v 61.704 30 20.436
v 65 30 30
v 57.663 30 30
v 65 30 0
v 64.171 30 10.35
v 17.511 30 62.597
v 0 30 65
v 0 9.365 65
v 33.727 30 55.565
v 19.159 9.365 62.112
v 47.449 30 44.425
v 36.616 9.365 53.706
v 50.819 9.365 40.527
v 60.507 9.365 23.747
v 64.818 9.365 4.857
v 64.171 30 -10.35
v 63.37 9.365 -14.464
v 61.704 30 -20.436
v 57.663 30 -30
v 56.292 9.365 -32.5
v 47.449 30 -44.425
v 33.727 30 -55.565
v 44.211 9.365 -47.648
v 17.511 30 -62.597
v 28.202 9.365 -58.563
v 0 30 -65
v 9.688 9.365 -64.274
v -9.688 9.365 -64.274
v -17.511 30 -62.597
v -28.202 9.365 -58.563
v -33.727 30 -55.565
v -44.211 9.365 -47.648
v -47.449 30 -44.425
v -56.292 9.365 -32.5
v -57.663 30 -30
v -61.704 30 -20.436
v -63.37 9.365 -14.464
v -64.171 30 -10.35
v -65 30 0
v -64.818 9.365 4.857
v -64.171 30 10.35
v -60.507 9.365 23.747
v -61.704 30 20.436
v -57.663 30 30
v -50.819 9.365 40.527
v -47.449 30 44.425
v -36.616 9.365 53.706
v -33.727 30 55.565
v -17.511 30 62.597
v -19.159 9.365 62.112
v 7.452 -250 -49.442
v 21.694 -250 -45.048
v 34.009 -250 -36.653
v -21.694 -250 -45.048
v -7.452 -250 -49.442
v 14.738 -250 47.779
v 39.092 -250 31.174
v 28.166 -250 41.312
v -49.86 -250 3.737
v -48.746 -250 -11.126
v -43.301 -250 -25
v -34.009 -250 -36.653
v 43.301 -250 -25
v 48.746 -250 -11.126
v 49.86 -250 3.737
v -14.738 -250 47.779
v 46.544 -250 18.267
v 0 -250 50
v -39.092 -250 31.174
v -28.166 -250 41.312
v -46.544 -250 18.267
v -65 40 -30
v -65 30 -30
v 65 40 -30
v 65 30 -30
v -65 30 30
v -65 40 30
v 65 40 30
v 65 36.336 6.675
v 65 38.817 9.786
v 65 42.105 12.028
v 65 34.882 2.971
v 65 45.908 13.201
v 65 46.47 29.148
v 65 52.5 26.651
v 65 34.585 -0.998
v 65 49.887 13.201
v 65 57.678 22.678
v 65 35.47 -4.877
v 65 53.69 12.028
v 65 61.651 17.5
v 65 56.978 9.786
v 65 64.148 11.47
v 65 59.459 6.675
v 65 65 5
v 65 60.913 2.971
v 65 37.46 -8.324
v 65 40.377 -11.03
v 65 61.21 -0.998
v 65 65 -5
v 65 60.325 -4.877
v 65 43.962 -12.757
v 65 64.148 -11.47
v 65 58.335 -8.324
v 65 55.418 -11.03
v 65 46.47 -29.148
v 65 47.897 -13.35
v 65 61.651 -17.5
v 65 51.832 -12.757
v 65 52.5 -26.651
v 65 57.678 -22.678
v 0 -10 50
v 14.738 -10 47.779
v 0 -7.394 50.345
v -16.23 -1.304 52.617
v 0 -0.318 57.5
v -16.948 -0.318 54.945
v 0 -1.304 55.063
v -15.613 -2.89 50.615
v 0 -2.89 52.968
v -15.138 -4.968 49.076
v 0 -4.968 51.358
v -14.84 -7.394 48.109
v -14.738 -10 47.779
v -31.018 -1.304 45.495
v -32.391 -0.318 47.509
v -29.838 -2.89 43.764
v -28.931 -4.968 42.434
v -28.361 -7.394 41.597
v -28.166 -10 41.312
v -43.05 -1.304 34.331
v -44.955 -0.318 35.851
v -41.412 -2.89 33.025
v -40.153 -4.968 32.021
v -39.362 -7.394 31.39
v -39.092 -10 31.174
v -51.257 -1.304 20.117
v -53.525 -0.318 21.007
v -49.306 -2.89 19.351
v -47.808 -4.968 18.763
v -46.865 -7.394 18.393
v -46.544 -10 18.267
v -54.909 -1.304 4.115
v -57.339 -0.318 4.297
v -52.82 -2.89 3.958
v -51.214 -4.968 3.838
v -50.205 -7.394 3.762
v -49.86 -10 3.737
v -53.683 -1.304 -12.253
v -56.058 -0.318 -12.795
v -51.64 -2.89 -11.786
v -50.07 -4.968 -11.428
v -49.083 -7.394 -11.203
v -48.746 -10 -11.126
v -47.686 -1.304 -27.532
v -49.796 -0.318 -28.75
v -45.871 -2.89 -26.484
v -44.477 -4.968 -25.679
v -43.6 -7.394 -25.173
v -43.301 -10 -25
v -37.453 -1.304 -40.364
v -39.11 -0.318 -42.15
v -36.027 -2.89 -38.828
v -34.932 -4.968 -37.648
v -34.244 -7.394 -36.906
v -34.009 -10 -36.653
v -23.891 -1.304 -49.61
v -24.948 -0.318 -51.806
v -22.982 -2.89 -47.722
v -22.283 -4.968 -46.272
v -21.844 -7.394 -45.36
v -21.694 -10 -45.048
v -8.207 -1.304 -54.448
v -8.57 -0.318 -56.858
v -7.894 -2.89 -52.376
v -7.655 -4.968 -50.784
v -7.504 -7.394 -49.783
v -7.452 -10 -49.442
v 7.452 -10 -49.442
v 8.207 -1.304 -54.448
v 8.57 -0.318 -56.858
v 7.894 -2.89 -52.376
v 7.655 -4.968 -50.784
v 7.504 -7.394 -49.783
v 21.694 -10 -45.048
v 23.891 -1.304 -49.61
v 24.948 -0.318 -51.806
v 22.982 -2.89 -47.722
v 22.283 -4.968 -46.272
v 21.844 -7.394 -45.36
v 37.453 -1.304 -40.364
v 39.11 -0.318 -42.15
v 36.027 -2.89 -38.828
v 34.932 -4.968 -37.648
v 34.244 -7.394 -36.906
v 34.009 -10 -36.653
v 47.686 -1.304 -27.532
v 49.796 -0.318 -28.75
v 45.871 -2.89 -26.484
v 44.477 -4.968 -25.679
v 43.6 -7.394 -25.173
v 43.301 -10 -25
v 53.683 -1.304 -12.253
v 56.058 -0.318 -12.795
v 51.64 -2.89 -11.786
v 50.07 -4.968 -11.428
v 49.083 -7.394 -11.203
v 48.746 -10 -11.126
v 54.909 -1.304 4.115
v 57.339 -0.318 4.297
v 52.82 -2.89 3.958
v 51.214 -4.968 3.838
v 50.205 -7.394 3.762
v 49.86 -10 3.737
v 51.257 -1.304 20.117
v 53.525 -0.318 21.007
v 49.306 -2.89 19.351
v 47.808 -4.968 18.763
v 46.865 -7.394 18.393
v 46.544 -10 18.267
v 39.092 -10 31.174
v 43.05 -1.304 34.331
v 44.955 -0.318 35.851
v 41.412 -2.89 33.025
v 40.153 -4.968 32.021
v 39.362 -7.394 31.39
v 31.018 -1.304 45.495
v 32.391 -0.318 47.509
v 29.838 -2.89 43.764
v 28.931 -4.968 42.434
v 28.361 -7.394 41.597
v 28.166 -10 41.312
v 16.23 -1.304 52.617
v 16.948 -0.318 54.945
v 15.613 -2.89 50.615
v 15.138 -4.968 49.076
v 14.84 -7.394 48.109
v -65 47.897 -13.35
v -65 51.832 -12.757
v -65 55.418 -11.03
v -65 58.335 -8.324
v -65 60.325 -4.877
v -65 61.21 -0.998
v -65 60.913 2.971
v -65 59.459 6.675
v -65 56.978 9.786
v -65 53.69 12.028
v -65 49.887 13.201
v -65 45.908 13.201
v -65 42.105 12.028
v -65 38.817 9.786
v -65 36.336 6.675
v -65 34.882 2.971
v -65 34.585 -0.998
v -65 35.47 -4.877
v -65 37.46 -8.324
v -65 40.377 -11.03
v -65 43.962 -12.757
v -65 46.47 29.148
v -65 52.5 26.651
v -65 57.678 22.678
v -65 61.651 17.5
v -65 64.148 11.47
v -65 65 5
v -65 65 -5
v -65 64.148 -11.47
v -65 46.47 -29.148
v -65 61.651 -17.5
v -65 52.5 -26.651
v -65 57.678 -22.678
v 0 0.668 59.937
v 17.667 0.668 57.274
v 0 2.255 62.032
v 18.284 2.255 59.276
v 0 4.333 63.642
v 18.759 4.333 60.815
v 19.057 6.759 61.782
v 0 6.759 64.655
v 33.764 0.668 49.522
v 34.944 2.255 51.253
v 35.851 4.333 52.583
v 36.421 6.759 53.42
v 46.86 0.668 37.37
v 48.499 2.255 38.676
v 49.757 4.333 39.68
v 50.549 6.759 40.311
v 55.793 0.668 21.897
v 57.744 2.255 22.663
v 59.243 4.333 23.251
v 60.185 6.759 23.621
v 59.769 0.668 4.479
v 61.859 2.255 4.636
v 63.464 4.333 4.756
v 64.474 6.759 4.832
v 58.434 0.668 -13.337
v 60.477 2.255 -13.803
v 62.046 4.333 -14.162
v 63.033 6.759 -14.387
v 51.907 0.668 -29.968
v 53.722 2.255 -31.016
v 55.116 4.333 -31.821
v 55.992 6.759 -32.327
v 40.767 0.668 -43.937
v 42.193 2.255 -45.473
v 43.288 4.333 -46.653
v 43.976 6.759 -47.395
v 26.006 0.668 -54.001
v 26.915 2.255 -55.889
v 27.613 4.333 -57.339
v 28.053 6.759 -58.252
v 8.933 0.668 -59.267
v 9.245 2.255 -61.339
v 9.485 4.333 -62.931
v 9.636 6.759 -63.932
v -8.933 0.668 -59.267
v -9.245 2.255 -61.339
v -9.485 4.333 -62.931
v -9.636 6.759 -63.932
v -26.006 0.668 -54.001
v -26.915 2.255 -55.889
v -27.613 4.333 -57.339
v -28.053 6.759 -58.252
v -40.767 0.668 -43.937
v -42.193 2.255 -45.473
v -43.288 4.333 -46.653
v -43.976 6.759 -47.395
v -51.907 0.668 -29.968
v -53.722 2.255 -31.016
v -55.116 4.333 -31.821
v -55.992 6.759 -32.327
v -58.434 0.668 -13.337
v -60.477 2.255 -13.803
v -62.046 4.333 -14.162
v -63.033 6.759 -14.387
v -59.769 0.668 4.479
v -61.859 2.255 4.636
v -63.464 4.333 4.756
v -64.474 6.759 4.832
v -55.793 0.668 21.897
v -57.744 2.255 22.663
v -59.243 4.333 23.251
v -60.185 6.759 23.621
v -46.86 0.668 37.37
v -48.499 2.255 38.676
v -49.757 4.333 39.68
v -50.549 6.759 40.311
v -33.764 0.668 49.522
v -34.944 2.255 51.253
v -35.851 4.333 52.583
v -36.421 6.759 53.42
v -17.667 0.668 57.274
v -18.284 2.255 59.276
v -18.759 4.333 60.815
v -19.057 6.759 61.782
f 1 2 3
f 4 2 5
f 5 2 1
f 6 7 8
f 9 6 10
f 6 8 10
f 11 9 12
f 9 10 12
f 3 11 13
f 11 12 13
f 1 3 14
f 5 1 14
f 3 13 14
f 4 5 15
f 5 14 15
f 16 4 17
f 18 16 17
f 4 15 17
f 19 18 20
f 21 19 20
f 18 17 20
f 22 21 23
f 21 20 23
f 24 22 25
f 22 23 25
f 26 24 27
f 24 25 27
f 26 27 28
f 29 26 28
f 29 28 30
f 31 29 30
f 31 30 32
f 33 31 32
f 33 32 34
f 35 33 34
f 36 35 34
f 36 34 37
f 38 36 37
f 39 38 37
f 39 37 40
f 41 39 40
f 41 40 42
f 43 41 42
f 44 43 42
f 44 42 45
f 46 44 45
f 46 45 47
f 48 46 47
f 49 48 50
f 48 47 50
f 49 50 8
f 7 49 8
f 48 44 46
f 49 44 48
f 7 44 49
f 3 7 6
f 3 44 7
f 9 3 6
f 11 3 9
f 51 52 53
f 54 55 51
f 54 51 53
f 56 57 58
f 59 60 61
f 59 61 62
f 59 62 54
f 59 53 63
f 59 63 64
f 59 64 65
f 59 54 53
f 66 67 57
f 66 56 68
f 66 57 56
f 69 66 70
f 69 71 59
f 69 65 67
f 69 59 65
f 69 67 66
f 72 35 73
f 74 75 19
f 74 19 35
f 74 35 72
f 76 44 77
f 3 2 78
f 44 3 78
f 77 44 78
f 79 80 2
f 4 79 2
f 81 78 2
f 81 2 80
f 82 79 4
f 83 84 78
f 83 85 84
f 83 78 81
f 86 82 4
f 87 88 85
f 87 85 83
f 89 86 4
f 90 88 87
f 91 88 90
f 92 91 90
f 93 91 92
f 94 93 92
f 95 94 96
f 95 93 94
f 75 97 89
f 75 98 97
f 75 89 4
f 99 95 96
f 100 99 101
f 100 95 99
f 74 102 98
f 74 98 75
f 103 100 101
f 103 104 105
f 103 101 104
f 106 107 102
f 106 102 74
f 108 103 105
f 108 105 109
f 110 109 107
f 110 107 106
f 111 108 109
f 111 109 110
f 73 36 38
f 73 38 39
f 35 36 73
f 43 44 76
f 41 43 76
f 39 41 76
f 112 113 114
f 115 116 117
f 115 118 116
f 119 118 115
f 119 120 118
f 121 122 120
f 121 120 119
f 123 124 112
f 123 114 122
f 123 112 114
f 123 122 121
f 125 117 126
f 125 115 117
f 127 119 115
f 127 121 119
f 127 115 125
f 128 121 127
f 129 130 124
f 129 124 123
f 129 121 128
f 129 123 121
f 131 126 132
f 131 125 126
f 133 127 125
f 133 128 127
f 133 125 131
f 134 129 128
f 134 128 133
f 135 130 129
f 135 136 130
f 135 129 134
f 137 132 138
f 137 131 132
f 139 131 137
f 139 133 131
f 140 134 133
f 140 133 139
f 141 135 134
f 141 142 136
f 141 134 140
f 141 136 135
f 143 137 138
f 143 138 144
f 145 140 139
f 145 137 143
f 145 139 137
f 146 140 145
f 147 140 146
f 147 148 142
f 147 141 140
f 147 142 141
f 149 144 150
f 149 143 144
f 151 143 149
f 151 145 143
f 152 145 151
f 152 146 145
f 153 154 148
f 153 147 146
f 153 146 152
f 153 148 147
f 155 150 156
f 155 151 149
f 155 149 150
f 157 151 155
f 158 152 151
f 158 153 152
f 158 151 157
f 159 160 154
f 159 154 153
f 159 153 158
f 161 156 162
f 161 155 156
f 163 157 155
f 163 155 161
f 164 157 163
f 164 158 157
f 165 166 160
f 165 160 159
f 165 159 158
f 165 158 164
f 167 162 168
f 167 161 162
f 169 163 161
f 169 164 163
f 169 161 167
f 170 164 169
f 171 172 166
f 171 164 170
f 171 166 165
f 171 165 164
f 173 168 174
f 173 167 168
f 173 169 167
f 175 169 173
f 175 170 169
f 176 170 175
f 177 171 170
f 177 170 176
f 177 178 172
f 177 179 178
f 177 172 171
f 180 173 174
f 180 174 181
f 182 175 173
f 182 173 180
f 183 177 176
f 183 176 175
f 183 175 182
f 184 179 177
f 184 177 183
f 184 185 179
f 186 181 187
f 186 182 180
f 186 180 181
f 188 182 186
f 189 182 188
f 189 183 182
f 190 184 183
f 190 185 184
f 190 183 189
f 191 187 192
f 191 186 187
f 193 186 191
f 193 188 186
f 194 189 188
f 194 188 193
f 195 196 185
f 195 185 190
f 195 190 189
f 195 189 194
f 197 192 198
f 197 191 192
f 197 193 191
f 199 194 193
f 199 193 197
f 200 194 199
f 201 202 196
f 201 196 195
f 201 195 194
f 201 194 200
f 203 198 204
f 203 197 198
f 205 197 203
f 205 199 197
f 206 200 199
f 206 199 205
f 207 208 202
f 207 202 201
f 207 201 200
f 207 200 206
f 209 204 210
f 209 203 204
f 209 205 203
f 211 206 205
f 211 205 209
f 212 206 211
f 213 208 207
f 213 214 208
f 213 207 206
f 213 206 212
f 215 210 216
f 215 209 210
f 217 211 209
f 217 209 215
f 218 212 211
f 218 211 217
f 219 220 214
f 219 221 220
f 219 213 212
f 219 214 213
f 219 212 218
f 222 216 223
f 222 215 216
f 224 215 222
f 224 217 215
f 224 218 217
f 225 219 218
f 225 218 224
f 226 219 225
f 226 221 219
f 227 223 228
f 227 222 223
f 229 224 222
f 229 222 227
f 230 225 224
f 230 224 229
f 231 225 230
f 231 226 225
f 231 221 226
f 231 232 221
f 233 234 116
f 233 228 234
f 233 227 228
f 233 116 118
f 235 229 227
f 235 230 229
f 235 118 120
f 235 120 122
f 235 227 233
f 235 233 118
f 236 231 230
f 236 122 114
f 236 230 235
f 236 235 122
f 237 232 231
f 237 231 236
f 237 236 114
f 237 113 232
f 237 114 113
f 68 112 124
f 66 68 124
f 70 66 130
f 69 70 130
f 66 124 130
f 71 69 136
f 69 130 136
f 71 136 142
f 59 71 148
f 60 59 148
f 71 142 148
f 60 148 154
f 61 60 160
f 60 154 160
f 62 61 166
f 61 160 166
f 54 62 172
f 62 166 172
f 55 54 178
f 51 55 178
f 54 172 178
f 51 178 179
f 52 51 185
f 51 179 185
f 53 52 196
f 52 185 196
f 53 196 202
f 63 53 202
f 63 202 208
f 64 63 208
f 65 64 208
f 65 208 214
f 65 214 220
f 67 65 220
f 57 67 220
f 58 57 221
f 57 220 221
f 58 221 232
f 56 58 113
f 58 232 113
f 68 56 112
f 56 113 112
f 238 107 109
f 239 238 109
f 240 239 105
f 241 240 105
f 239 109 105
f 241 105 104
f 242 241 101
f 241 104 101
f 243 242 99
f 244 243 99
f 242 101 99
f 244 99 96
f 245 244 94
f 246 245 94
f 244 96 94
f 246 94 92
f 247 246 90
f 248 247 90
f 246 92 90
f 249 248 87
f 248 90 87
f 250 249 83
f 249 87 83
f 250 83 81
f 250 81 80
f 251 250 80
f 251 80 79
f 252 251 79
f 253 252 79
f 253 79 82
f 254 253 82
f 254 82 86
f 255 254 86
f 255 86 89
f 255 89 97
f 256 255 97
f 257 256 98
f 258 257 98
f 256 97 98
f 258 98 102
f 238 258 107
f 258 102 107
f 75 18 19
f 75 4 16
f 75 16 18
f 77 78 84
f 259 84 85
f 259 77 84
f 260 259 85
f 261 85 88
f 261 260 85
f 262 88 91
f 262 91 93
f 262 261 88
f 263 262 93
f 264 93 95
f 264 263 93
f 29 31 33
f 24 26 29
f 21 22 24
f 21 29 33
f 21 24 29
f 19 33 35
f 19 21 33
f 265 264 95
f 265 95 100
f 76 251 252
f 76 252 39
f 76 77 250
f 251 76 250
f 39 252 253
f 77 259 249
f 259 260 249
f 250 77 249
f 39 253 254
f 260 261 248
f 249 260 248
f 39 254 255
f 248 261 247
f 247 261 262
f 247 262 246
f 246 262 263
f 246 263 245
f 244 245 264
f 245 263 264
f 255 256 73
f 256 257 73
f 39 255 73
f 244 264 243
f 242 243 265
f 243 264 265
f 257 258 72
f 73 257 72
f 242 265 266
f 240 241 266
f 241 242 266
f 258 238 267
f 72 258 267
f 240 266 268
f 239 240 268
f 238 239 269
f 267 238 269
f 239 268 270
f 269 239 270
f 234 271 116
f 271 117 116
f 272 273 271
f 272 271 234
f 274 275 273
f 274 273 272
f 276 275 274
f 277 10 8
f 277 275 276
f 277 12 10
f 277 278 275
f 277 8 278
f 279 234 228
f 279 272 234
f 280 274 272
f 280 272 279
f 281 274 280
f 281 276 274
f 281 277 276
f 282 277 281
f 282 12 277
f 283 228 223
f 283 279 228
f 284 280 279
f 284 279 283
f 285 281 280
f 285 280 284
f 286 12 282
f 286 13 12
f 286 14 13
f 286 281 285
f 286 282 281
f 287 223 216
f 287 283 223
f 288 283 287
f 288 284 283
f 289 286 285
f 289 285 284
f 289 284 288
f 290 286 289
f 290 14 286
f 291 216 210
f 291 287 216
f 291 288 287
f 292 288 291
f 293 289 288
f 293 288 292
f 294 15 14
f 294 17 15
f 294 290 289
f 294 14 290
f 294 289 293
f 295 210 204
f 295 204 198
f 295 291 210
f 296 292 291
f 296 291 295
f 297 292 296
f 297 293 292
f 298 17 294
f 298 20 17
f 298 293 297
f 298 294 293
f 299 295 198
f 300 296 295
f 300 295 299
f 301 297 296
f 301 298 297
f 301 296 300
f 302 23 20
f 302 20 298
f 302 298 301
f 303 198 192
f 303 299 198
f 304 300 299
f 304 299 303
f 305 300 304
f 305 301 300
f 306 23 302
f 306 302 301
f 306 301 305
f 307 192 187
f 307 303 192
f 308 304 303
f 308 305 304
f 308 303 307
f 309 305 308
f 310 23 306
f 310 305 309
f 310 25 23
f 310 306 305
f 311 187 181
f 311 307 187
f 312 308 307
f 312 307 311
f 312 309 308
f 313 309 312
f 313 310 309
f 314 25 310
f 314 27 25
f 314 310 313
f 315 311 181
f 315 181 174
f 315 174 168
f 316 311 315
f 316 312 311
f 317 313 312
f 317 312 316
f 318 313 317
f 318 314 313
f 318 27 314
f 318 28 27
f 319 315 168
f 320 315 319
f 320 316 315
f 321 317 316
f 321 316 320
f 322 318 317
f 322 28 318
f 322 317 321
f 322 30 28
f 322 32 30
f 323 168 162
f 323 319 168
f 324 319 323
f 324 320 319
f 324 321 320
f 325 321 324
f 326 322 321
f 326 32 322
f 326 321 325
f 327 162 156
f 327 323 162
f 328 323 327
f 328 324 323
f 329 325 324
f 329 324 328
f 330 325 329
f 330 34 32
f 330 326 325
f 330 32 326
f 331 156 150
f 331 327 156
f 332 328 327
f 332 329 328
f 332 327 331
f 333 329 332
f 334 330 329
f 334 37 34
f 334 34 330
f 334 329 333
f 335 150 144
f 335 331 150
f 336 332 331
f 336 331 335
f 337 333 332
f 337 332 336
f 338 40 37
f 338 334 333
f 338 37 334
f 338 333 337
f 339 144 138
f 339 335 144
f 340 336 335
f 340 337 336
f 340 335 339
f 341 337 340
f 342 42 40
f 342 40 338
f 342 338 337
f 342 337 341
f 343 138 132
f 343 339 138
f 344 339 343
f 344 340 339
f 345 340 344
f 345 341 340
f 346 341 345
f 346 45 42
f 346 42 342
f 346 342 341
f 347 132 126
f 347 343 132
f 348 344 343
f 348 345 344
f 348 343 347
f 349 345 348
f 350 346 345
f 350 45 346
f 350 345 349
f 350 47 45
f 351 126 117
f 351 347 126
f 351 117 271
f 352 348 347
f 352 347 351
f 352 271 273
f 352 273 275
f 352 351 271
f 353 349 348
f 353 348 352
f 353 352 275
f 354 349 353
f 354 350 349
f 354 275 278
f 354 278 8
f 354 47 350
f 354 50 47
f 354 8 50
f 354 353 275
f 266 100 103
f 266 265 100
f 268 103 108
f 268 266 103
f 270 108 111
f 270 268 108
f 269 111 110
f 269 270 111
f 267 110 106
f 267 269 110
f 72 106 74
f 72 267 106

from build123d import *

# Parameters (mm, degrees)
SKETCH1_R           = 65
BOSS_EXTRUDE1_DEPTH = 30
SKETCH2_R           = 50
BOSS_EXTRUDE2_DEPTH = 250
FILLET1_R           = 10
FILLET2_R           = 10
SKETCH3_W           = 60
SKETCH3_H           = 35
BOSS_EXTRUDE3_DEPTH = 65
SKETCH4_R           = 13.35
CUT_EXTRUDE1_DEPTH  = 130
FILLET3_R           = 25


with BuildPart() as part:
    # Sketch1 → Boss-Extrude1 (new body)
    with BuildSketch(Plane(origin=(0, 0, 0), x_dir=(1, 0, 0), z_dir=(0, 1, 0))):
        with Locations(Location((0, 0, 0), (0, 0, 270))):
            Circle(SKETCH1_R)
    extrude(amount=BOSS_EXTRUDE1_DEPTH)

    # Sketch2 → Boss-Extrude2 (add)
    with BuildSketch(Plane.XZ):
        with Locations(Location((0, 0, 0), (0, 0, 90))):
            Circle(SKETCH2_R)
    extrude(amount=BOSS_EXTRUDE2_DEPTH)

    # Fillet1
    fillet1_edges = [part.edges().sort_by_distance(p)[0] for p in [
        (0, 0, -50),
    ]]
    fillet(fillet1_edges, radius=FILLET1_R)

    # Fillet2
    # the kernel refuses this fillet: 10 mm, written as the material it takes off along each edge
    with BuildSketch(Plane(origin=(0, 0, 0), x_dir=(0, 0, 1), z_dir=(-1, 0, 0))) as fillet2_piece_1:
        with BuildLine():
            CenterArc((55, 9.364916731), FILLET2_R, 284.477512186, 75.522487814)
            Line((65, 9.364916731), (66, 9.364916731))
            Line((66, 9.364916731), (66, 0))
            Line((66, 0), (65, -1))
            ThreePointArc((65, -1), (60, -1), (57.75, -1.285787471))
            Line((57.75, -1.285787471), (57.5, -0.317541634))
        make_face()
    revolve(axis=Axis((0, 0, 0), (0, 1, 0)), mode=Mode.SUBTRACT)

    # Sketch3 → Boss-Extrude3 (add, symmetric)
    with BuildSketch(Plane(origin=(0, 0, 0), x_dir=(0, 0, -1), z_dir=(1, 0, 0))):
        with Locations((0, 47.5)):
            Rectangle(SKETCH3_W, SKETCH3_H)
    extrude(amount=BOSS_EXTRUDE3_DEPTH, both=True)

    # Sketch4 → Cut-Extrude1 (cut)
    with BuildSketch(Plane(origin=(65, 0, 0), x_dir=(0, 0, -1), z_dir=(1, 0, 0))):
        with Locations((0, 47.897467929)):
            Circle(SKETCH4_R)
    extrude(amount=-CUT_EXTRUDE1_DEPTH, mode=Mode.SUBTRACT)

    # Fillet3
    fillet3_edges = [part.edges().sort_by_distance(p)[0] for p in [
        (0, 65, 30),
        (0, 65, -30),
    ]]
    fillet(fillet3_edges, radius=FILLET3_R)


solid = part.part
